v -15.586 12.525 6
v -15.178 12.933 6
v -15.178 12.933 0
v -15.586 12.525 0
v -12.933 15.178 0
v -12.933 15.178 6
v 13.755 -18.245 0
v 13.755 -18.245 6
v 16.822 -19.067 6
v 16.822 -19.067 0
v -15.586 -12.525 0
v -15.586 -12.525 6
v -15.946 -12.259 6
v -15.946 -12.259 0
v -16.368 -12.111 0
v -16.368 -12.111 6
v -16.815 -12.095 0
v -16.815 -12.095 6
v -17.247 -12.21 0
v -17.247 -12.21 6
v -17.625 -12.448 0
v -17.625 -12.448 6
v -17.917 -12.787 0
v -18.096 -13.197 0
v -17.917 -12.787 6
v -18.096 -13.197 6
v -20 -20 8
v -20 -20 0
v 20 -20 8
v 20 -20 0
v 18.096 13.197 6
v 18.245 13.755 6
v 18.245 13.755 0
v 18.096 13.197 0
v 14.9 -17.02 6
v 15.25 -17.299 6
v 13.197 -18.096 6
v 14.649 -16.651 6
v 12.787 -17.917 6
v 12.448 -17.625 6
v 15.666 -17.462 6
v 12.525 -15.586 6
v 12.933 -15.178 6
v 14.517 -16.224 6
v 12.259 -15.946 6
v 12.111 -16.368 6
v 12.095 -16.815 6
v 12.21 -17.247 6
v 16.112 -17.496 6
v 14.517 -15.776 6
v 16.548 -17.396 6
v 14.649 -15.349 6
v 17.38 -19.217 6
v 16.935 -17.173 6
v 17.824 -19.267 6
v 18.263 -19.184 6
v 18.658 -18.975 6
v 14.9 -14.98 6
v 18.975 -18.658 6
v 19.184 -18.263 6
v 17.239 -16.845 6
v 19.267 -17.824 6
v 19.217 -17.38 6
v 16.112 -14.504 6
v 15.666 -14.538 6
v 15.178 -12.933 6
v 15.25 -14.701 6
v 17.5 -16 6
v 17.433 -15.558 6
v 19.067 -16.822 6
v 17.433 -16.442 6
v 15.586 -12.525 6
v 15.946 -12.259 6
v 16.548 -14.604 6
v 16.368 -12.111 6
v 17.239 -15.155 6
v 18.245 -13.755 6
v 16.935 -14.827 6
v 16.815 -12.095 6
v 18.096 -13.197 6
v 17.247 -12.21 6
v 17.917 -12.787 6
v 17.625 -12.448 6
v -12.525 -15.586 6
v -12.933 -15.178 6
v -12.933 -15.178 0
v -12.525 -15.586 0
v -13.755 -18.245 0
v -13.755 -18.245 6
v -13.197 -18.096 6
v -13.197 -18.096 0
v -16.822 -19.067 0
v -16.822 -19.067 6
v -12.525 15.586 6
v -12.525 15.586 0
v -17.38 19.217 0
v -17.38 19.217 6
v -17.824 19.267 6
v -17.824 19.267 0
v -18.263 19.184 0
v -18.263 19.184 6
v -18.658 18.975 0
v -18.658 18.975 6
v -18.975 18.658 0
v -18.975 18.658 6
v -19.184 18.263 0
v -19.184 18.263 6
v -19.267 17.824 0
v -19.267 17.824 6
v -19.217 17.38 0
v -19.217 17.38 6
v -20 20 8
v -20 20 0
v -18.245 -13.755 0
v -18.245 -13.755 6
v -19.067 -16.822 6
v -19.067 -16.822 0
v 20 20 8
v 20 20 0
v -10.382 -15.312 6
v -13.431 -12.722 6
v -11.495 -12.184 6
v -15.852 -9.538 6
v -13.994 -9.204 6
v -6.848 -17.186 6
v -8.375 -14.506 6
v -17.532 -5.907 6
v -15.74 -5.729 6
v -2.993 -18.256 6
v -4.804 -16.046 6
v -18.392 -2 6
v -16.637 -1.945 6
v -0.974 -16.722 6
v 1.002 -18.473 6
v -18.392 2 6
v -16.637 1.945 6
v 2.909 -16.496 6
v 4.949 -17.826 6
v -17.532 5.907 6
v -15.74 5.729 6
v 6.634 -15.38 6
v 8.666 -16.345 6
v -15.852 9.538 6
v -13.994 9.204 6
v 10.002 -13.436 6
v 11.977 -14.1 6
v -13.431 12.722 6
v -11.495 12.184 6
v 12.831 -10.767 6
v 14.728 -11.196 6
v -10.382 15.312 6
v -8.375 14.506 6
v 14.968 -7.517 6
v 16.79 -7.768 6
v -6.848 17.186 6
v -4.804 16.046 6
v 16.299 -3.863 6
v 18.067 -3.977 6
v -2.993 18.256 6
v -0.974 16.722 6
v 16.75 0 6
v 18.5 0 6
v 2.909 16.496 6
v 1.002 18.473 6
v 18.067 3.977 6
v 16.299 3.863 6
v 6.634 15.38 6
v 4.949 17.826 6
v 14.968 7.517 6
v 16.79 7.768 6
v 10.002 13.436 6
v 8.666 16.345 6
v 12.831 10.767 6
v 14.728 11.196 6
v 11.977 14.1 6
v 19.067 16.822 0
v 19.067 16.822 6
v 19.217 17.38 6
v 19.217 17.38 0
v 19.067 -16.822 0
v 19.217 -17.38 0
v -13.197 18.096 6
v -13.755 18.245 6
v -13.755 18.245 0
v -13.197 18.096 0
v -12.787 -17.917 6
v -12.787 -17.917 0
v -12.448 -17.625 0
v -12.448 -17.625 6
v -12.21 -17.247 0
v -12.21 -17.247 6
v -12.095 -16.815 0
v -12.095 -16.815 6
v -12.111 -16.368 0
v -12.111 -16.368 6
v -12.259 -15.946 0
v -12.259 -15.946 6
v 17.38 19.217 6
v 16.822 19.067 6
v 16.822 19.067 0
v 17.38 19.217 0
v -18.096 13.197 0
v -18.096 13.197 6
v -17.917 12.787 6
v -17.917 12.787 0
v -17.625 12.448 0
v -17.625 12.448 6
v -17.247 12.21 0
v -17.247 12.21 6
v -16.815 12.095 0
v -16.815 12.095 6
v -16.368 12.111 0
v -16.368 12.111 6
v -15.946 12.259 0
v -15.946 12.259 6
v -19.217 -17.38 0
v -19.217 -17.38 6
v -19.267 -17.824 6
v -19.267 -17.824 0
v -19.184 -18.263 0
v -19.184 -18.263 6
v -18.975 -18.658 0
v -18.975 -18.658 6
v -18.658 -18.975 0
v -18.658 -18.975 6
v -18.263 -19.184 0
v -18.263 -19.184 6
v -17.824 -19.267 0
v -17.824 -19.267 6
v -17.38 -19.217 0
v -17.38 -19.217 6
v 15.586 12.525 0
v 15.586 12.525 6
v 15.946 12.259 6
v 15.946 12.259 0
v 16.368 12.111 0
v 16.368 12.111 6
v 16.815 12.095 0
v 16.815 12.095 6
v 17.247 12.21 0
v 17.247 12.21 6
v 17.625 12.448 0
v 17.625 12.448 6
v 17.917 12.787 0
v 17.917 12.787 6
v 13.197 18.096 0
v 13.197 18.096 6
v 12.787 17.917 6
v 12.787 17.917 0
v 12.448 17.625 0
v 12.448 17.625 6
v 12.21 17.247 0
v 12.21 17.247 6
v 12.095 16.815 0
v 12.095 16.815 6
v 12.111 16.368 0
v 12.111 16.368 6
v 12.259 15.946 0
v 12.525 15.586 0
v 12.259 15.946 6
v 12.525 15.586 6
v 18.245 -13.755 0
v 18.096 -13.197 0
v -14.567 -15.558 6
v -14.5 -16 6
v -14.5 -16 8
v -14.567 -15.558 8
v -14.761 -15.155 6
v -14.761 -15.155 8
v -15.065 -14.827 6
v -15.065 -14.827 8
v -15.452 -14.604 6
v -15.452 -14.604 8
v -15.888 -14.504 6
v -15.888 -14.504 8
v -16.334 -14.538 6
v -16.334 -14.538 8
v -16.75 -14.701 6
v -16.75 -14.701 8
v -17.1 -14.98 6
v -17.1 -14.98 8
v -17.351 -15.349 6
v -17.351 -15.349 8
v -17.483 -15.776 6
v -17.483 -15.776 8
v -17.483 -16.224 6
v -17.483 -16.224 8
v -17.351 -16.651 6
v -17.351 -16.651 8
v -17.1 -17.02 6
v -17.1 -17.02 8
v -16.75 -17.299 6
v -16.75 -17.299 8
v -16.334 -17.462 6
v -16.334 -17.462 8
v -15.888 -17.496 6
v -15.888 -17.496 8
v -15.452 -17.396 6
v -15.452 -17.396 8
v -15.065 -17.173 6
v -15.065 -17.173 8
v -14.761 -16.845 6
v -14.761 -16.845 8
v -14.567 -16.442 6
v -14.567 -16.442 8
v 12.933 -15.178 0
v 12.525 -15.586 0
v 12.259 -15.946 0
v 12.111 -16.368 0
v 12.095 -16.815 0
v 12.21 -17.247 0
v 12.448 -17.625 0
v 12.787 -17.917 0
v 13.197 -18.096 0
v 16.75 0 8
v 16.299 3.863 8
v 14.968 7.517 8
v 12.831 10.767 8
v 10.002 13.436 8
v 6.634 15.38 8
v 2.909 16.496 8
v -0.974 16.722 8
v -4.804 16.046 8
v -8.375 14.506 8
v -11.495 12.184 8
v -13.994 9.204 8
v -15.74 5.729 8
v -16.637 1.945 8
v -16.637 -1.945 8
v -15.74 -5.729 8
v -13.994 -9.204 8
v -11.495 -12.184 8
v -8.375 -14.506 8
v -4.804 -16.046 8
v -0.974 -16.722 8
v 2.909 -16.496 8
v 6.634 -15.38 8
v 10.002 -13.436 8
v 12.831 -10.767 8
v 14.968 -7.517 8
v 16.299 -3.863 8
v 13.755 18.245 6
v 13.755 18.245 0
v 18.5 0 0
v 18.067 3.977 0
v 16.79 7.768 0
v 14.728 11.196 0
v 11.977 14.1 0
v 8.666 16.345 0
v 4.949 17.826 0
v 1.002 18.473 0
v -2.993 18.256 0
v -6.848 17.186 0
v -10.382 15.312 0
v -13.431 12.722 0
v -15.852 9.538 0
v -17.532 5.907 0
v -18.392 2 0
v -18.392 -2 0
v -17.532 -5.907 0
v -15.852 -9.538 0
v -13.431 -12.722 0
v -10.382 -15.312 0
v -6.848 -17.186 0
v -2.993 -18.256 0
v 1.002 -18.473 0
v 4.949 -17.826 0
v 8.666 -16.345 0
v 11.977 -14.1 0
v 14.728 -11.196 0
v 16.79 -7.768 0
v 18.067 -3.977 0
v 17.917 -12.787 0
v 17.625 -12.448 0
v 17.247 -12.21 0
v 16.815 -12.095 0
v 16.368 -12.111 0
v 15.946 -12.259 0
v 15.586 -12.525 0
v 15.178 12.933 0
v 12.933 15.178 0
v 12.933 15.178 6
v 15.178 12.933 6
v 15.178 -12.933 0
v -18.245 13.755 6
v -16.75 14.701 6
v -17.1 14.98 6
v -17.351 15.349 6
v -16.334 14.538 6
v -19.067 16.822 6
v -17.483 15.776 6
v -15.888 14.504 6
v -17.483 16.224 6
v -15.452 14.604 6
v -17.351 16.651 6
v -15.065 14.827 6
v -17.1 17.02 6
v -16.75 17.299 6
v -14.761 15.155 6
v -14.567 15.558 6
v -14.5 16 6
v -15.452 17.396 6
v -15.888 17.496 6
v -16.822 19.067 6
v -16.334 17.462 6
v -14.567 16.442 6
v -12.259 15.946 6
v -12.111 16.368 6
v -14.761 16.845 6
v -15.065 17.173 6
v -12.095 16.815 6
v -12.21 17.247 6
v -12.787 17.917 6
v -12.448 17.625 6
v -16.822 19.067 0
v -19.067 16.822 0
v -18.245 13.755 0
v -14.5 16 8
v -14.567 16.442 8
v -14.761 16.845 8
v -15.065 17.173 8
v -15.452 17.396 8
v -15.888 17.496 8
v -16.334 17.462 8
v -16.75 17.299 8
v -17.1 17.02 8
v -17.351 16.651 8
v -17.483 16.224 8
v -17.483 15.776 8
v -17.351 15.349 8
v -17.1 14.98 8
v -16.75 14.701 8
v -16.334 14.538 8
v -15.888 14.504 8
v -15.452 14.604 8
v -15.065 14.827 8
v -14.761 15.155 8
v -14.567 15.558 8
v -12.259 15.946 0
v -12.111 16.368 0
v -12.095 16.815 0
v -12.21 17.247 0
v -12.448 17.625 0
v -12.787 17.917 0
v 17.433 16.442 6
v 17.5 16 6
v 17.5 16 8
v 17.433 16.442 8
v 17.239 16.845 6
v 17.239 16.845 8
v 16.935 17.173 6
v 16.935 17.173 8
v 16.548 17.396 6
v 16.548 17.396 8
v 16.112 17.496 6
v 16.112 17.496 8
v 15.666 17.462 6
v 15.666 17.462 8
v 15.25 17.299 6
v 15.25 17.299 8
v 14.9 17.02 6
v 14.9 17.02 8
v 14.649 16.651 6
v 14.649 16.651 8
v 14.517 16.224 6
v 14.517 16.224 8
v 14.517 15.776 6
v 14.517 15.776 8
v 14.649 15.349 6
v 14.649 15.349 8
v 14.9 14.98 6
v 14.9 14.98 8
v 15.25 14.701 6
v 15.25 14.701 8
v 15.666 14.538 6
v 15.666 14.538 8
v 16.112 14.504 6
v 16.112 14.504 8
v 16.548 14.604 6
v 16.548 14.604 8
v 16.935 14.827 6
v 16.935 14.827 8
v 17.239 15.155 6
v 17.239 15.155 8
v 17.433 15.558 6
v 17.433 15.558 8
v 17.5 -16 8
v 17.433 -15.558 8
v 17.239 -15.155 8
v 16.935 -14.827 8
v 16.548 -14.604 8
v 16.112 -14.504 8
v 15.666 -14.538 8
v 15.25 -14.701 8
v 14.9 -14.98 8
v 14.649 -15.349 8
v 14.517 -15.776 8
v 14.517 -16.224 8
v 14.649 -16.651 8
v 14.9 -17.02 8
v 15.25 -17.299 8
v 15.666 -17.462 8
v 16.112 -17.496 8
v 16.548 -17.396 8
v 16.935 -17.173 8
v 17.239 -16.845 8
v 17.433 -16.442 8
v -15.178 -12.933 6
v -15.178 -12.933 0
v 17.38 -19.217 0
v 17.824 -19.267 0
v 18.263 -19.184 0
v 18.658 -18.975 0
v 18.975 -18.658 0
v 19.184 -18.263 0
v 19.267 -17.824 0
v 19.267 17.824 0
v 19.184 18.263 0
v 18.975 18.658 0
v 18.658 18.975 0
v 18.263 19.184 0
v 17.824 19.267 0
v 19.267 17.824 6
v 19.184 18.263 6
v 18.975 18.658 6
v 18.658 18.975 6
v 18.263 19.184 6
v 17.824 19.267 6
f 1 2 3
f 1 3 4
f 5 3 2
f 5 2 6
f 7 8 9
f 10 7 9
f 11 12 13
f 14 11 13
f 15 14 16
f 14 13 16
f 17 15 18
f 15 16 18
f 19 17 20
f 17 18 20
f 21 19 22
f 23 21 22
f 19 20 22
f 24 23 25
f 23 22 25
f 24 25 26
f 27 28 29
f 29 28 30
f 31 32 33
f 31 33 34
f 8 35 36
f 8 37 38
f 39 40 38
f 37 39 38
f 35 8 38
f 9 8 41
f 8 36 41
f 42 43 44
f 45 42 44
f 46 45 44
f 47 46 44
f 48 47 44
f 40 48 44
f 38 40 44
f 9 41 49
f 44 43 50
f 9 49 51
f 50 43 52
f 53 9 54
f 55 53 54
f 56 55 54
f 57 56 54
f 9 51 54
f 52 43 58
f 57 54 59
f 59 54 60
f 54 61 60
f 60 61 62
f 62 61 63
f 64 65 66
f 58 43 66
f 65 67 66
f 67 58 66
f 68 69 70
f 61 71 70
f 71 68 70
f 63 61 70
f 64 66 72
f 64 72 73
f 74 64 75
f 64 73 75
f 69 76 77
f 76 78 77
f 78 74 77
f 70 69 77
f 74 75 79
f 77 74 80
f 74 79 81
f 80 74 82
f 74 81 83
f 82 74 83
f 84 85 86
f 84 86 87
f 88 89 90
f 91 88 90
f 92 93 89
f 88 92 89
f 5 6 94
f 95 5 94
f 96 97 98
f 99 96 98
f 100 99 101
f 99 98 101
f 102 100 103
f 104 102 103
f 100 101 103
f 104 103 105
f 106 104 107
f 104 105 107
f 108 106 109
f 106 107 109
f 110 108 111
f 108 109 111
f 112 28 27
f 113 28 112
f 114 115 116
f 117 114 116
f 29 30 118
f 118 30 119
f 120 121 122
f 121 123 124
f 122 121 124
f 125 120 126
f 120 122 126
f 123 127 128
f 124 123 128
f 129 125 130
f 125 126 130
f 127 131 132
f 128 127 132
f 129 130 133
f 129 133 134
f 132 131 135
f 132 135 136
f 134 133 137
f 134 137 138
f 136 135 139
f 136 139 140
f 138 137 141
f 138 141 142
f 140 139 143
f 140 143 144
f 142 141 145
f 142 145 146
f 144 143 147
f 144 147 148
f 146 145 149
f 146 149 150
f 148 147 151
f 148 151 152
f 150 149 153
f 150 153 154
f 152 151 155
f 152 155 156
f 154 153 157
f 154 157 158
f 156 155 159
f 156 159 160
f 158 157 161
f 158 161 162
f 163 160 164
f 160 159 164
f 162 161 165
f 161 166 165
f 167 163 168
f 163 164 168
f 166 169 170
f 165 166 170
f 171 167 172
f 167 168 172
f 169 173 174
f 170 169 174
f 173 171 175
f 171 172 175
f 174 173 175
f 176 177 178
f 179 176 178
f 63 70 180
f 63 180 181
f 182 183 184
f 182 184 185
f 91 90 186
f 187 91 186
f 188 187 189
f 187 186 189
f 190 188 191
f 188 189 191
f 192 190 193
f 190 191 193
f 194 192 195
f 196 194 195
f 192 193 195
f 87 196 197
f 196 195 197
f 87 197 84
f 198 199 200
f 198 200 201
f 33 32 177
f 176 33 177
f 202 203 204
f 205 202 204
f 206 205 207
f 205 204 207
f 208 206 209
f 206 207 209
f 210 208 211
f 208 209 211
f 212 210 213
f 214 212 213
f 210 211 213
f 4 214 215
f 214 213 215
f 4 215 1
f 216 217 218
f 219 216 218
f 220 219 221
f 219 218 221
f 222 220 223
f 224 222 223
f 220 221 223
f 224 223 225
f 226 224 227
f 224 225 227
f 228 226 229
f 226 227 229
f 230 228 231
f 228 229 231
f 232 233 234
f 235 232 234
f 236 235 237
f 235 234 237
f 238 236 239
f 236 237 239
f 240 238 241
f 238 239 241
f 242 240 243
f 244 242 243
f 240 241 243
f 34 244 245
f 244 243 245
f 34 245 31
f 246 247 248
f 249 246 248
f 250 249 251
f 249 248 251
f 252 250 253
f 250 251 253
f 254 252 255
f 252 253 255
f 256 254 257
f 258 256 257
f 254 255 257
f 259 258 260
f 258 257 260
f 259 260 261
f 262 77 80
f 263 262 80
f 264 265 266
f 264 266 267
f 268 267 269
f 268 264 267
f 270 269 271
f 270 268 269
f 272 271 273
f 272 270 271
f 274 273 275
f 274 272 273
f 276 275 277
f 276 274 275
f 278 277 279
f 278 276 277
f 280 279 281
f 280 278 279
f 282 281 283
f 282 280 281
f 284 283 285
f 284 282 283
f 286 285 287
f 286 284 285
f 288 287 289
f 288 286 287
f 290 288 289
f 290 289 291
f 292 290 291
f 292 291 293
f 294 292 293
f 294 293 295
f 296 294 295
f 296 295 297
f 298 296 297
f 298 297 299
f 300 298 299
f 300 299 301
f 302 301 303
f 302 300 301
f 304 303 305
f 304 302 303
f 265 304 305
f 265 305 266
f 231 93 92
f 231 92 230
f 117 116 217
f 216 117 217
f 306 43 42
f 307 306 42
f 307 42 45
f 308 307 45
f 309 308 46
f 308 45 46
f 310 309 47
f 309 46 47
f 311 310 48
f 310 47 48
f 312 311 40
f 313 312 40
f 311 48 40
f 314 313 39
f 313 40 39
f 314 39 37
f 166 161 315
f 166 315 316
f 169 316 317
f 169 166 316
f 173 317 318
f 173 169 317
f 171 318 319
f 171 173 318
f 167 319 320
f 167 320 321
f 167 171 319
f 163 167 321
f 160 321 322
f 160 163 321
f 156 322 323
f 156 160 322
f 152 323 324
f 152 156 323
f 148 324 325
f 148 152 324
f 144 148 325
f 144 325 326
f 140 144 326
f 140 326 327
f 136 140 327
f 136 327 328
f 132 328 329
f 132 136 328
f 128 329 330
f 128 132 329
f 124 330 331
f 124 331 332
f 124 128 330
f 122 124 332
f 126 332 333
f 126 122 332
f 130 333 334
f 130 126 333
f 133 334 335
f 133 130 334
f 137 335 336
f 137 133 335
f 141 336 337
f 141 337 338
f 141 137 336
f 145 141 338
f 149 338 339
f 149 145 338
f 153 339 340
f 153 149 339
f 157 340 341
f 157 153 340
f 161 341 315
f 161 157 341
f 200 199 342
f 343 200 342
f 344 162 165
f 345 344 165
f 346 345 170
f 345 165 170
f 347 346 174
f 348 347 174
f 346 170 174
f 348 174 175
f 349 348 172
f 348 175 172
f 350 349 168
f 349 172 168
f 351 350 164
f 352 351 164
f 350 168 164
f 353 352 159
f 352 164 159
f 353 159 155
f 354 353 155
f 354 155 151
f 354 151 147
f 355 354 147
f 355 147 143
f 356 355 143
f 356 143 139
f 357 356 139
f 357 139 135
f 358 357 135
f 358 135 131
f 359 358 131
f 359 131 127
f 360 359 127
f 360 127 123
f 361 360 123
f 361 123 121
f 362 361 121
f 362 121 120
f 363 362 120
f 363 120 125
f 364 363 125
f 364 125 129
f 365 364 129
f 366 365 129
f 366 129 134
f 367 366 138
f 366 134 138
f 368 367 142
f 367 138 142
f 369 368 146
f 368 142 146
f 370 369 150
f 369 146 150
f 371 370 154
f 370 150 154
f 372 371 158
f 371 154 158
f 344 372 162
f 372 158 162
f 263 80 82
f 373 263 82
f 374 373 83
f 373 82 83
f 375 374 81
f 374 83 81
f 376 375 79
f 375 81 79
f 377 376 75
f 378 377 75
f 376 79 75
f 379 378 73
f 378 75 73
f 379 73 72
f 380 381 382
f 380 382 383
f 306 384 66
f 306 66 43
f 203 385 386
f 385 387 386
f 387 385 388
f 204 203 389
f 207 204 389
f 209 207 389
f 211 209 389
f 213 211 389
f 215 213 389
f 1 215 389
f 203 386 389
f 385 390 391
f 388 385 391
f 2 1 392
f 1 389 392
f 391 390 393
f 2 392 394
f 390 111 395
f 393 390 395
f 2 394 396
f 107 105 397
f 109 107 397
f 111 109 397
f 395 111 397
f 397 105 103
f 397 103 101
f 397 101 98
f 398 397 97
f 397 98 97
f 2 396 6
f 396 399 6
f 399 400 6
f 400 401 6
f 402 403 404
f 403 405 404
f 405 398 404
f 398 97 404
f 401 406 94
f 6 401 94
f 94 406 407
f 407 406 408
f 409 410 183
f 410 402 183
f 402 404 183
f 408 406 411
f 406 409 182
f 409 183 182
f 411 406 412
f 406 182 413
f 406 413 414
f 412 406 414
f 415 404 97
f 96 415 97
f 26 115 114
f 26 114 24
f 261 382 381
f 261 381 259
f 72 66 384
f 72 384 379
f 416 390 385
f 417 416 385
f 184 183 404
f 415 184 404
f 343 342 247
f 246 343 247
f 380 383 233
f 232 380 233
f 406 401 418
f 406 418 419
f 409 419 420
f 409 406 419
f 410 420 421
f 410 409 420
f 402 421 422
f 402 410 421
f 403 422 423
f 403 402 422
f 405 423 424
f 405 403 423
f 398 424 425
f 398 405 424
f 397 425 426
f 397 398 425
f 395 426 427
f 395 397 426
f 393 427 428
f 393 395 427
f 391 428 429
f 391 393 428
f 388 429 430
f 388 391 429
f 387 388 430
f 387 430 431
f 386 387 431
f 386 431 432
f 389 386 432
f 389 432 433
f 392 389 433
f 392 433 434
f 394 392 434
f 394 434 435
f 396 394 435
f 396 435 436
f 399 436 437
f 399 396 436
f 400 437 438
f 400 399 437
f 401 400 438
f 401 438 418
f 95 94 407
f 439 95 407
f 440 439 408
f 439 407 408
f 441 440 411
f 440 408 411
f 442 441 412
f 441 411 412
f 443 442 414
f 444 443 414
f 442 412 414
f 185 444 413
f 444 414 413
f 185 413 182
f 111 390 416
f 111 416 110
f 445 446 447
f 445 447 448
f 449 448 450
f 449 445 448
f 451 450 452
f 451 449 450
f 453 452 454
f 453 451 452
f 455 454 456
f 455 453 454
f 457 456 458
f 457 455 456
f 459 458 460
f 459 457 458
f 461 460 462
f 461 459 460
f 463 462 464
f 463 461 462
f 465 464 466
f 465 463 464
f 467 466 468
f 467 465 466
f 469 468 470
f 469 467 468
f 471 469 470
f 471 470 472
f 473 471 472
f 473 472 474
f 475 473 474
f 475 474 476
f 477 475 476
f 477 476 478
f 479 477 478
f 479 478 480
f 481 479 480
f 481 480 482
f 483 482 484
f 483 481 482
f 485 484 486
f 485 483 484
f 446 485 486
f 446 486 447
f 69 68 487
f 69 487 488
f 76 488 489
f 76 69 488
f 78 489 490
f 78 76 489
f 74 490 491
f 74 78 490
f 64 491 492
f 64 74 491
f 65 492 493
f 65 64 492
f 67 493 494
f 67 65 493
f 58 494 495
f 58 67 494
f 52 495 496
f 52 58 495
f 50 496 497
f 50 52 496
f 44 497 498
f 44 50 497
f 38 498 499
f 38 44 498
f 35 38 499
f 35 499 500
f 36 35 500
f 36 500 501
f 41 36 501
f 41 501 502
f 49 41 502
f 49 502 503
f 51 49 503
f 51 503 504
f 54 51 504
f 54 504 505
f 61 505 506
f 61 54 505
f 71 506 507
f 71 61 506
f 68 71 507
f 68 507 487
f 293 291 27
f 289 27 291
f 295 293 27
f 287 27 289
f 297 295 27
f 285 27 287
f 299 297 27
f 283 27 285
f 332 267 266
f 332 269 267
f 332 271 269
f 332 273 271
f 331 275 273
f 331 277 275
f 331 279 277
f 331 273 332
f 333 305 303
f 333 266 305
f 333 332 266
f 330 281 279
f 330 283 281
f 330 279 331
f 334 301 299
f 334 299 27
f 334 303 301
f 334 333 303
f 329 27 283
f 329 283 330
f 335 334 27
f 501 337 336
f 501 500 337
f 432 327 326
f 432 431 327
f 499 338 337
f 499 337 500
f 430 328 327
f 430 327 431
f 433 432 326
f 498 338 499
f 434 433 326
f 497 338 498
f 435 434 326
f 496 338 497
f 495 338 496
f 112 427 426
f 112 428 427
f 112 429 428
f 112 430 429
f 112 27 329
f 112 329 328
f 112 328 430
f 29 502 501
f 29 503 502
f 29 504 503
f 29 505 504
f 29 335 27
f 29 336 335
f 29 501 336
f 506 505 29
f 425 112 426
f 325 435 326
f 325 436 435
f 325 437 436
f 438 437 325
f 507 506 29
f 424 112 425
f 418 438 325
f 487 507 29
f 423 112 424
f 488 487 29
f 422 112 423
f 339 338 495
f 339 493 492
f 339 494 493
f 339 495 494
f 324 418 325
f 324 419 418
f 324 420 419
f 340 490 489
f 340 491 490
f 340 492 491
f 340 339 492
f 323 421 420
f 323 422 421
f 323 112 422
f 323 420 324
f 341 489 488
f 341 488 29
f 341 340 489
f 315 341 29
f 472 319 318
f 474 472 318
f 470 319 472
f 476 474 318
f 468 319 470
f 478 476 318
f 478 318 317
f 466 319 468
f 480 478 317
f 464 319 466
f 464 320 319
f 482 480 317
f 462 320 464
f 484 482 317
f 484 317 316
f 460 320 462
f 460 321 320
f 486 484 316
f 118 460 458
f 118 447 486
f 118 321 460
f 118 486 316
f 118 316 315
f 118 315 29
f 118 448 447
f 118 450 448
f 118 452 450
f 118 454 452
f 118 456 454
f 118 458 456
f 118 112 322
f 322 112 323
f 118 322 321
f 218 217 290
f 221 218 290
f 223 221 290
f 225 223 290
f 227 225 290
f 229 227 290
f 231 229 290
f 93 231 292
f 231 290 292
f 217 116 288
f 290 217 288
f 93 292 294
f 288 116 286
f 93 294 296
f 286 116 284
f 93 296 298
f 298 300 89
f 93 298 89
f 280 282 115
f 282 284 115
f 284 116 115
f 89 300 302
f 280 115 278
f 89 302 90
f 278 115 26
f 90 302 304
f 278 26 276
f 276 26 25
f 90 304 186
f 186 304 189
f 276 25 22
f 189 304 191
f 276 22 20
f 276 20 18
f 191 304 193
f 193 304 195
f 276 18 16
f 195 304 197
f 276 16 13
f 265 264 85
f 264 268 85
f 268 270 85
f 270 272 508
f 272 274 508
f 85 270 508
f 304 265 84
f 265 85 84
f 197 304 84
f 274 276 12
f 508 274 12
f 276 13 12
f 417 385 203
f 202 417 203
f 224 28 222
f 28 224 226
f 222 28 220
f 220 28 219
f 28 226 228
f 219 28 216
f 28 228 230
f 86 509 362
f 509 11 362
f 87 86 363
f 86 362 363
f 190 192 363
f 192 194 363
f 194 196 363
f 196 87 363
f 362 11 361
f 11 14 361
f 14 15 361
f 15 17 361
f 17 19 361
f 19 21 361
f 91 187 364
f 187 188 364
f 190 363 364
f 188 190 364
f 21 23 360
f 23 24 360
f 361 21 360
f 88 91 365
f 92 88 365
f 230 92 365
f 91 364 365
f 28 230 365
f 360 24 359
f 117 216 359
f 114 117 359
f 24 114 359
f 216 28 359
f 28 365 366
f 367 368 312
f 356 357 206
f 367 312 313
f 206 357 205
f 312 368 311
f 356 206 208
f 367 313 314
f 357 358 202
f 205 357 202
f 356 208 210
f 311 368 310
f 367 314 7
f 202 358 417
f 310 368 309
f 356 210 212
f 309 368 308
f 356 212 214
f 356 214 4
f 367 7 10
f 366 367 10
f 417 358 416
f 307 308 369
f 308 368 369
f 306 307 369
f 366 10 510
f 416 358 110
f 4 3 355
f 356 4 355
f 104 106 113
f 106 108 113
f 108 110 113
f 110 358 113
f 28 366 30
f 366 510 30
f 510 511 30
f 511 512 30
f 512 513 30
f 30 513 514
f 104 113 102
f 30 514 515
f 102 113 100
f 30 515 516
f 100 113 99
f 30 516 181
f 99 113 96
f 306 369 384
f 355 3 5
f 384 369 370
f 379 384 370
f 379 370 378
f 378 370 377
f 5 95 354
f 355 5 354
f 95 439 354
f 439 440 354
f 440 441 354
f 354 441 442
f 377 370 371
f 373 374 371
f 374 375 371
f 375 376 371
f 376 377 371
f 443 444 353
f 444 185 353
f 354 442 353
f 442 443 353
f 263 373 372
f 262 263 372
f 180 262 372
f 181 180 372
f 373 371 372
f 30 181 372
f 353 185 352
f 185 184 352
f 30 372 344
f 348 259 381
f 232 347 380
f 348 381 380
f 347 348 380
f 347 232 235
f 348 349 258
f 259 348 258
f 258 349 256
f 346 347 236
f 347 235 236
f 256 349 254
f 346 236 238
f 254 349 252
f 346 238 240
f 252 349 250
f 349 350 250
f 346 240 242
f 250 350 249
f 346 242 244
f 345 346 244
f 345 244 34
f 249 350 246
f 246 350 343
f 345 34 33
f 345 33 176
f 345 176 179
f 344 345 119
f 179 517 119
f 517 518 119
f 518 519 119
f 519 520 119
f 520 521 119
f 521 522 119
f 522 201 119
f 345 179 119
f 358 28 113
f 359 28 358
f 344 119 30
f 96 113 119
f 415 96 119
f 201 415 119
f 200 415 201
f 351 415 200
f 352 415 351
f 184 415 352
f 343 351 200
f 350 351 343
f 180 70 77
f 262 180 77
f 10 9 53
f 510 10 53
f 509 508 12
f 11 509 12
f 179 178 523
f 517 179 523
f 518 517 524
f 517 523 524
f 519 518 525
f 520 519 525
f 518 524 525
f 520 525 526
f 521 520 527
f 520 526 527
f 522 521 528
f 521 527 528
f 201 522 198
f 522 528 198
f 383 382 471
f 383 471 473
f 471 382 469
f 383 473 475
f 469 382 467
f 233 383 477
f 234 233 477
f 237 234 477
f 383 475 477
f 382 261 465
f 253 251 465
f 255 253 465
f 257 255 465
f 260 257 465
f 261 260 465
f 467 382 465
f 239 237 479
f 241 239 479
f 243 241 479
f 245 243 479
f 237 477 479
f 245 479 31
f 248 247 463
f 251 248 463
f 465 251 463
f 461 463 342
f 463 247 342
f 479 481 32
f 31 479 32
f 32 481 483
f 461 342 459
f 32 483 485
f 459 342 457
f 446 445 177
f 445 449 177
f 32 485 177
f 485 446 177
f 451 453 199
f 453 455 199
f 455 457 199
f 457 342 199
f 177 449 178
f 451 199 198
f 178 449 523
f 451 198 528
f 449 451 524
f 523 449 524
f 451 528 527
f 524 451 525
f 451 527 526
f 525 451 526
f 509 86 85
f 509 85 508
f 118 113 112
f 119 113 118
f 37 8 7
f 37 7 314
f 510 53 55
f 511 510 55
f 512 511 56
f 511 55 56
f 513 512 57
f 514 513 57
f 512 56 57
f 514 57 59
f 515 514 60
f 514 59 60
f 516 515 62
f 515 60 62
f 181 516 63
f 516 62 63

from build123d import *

# Parameters (mm, degrees)
SKETCH_W        = 40
SKETCH_H        = 40
PAD_DEPTH       = 6
POCKET_DEPTH    = 6.001
SKETCH006_R     = 18.5
POCKET001_DEPTH = 6.001
SKETCH007_W     = 40
SKETCH007_H     = 40
SKETCH007_R     = 16.75
SKETCH007_R_2   = 1.5
PAD001_DEPTH    = 2


with BuildPart() as part:
    # Sketch → Pad (new body)
    with BuildSketch(Plane.XY):
        Rectangle(SKETCH_W, SKETCH_H)
    extrude(amount=PAD_DEPTH)

    # Sketch004 (on Face6 of Pad) → Pocket (cut, through all)
    with BuildSketch(Plane.XY.offset(6)):
        with BuildLine():
            Line((12.932774, 15.178139), (15.178139, 12.932774))
            Line((15.178139, 12.932774), (15.586387, 12.524525))
            ThreePointArc((15.586387, 12.524525), (17.035276, 12.136297), (18.095936, 13.196957))
            Line((18.245366, 13.754634), (18.095936, 13.196957))
            Line((18.245366, 13.754634), (19.067226, 16.821861))
            Line((19.067226, 16.821861), (19.216656, 17.379538))
            ThreePointArc((19.216656, 17.379538), (18.828427, 18.828427), (17.379538, 19.216656))
            Line((16.821861, 19.067226), (17.379538, 19.216656))
            Line((16.821861, 19.067226), (13.754634, 18.245366))
            Line((13.754634, 18.245366), (13.196957, 18.095936))
            ThreePointArc((13.196957, 18.095936), (12.136297, 17.035276), (12.524525, 15.586387))
            Line((12.932774, 15.178139), (12.524525, 15.586387))
        make_face()
        with BuildLine():
            Line((13.754634, -18.245366), (16.821861, -19.067226))
            Line((16.821861, -19.067226), (17.379538, -19.216656))
            ThreePointArc((17.379538, -19.216656), (18.828427, -18.828427), (19.216656, -17.379538))
            Line((19.067226, -16.821861), (19.216656, -17.379538))
            Line((19.067226, -16.821861), (18.245366, -13.754634))
            Line((18.245366, -13.754634), (18.095936, -13.196957))
            ThreePointArc((18.095936, -13.196957), (17.035276, -12.136297), (15.586387, -12.524525))
            Line((15.178139, -12.932774), (15.586387, -12.524525))
            Line((15.178139, -12.932774), (12.932774, -15.178139))
            Line((12.932774, -15.178139), (12.524525, -15.586387))
            ThreePointArc((12.524525, -15.586387), (12.136297, -17.035276), (13.196957, -18.095936))
            Line((13.754634, -18.245366), (13.196957, -18.095936))
        make_face()
        with BuildLine():
            Line((-13.754634, 18.245366), (-16.821861, 19.067226))
            Line((-16.821861, 19.067226), (-17.379538, 19.216656))
            ThreePointArc((-17.379538, 19.216656), (-18.828427, 18.828427), (-19.216656, 17.379538))
            Line((-19.067226, 16.821861), (-19.216656, 17.379538))
            Line((-19.067226, 16.821861), (-18.245366, 13.754634))
            Line((-18.245366, 13.754634), (-18.095936, 13.196957))
            ThreePointArc((-18.095936, 13.196957), (-17.035276, 12.136297), (-15.586387, 12.524525))
            Line((-15.178139, 12.932774), (-15.586387, 12.524525))
            Line((-15.178139, 12.932774), (-12.932774, 15.178139))
            Line((-12.932774, 15.178139), (-12.524525, 15.586387))
            ThreePointArc((-12.524525, 15.586387), (-12.136297, 17.035276), (-13.196957, 18.095936))
            Line((-13.754634, 18.245366), (-13.196957, 18.095936))
        make_face()
        with BuildLine():
            Line((-12.932774, -15.178139), (-15.178139, -12.932774))
            Line((-15.178139, -12.932774), (-15.586387, -12.524525))
            ThreePointArc((-15.586387, -12.524525), (-17.035276, -12.136297), (-18.095936, -13.196957))
            Line((-18.245366, -13.754634), (-18.095936, -13.196957))
            Line((-18.245366, -13.754634), (-19.067226, -16.821861))
            Line((-19.067226, -16.821861), (-19.216656, -17.379538))
            ThreePointArc((-19.216656, -17.379538), (-18.828427, -18.828427), (-17.379538, -19.216656))
            Line((-16.821861, -19.067226), (-17.379538, -19.216656))
            Line((-16.821861, -19.067226), (-13.754634, -18.245366))
            Line((-13.754634, -18.245366), (-13.196957, -18.095936))
            ThreePointArc((-13.196957, -18.095936), (-12.136297, -17.035276), (-12.524525, -15.586387))
            Line((-12.932774, -15.178139), (-12.524525, -15.586387))
        make_face()
    extrude(amount=-POCKET_DEPTH, mode=Mode.SUBTRACT)

    # Sketch006 (on Face5 of Pocket) → Pocket001 (cut, through all)
    with BuildSketch(Plane.XY.offset(6)):
        Circle(SKETCH006_R)
    extrude(amount=-POCKET001_DEPTH, mode=Mode.SUBTRACT)

    # Sketch007 (on Face5 of Pocket001) → Pad001 (join)
    with BuildSketch(Plane.XY.offset(6)):
        Rectangle(SKETCH007_W, SKETCH007_H)
        Circle(SKETCH007_R, mode=Mode.SUBTRACT)
        with Locations((-16, 16)):
            Circle(SKETCH007_R_2, mode=Mode.SUBTRACT)
        with Locations((16, 16)):
            Circle(SKETCH007_R_2, mode=Mode.SUBTRACT)
        with Locations((16, -16)):
            Circle(SKETCH007_R_2, mode=Mode.SUBTRACT)
        with Locations((-16, -16)):
            Circle(SKETCH007_R_2, mode=Mode.SUBTRACT)
    extrude(amount=PAD001_DEPTH)


solid = part.part
